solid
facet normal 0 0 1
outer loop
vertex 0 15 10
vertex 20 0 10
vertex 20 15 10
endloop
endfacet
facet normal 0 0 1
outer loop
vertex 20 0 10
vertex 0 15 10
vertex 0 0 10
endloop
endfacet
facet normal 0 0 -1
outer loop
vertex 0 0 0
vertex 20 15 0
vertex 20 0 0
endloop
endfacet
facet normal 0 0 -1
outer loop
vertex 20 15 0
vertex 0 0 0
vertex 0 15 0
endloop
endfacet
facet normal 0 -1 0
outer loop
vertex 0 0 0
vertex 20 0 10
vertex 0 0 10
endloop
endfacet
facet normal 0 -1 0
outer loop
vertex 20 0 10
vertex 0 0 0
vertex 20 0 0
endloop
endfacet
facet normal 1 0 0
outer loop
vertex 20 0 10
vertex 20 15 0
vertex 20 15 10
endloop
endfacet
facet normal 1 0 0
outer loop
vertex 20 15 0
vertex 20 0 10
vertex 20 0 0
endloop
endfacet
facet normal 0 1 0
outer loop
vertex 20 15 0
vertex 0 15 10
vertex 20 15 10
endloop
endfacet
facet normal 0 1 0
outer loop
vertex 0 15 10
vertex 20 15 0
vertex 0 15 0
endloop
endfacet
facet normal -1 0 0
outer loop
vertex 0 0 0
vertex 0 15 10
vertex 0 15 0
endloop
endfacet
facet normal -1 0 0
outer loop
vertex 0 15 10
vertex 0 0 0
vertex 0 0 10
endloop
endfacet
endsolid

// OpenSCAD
// Assumption: corner at the origin, block extends into +X, +Y, +Z.
cube([20, 15, 10]);
